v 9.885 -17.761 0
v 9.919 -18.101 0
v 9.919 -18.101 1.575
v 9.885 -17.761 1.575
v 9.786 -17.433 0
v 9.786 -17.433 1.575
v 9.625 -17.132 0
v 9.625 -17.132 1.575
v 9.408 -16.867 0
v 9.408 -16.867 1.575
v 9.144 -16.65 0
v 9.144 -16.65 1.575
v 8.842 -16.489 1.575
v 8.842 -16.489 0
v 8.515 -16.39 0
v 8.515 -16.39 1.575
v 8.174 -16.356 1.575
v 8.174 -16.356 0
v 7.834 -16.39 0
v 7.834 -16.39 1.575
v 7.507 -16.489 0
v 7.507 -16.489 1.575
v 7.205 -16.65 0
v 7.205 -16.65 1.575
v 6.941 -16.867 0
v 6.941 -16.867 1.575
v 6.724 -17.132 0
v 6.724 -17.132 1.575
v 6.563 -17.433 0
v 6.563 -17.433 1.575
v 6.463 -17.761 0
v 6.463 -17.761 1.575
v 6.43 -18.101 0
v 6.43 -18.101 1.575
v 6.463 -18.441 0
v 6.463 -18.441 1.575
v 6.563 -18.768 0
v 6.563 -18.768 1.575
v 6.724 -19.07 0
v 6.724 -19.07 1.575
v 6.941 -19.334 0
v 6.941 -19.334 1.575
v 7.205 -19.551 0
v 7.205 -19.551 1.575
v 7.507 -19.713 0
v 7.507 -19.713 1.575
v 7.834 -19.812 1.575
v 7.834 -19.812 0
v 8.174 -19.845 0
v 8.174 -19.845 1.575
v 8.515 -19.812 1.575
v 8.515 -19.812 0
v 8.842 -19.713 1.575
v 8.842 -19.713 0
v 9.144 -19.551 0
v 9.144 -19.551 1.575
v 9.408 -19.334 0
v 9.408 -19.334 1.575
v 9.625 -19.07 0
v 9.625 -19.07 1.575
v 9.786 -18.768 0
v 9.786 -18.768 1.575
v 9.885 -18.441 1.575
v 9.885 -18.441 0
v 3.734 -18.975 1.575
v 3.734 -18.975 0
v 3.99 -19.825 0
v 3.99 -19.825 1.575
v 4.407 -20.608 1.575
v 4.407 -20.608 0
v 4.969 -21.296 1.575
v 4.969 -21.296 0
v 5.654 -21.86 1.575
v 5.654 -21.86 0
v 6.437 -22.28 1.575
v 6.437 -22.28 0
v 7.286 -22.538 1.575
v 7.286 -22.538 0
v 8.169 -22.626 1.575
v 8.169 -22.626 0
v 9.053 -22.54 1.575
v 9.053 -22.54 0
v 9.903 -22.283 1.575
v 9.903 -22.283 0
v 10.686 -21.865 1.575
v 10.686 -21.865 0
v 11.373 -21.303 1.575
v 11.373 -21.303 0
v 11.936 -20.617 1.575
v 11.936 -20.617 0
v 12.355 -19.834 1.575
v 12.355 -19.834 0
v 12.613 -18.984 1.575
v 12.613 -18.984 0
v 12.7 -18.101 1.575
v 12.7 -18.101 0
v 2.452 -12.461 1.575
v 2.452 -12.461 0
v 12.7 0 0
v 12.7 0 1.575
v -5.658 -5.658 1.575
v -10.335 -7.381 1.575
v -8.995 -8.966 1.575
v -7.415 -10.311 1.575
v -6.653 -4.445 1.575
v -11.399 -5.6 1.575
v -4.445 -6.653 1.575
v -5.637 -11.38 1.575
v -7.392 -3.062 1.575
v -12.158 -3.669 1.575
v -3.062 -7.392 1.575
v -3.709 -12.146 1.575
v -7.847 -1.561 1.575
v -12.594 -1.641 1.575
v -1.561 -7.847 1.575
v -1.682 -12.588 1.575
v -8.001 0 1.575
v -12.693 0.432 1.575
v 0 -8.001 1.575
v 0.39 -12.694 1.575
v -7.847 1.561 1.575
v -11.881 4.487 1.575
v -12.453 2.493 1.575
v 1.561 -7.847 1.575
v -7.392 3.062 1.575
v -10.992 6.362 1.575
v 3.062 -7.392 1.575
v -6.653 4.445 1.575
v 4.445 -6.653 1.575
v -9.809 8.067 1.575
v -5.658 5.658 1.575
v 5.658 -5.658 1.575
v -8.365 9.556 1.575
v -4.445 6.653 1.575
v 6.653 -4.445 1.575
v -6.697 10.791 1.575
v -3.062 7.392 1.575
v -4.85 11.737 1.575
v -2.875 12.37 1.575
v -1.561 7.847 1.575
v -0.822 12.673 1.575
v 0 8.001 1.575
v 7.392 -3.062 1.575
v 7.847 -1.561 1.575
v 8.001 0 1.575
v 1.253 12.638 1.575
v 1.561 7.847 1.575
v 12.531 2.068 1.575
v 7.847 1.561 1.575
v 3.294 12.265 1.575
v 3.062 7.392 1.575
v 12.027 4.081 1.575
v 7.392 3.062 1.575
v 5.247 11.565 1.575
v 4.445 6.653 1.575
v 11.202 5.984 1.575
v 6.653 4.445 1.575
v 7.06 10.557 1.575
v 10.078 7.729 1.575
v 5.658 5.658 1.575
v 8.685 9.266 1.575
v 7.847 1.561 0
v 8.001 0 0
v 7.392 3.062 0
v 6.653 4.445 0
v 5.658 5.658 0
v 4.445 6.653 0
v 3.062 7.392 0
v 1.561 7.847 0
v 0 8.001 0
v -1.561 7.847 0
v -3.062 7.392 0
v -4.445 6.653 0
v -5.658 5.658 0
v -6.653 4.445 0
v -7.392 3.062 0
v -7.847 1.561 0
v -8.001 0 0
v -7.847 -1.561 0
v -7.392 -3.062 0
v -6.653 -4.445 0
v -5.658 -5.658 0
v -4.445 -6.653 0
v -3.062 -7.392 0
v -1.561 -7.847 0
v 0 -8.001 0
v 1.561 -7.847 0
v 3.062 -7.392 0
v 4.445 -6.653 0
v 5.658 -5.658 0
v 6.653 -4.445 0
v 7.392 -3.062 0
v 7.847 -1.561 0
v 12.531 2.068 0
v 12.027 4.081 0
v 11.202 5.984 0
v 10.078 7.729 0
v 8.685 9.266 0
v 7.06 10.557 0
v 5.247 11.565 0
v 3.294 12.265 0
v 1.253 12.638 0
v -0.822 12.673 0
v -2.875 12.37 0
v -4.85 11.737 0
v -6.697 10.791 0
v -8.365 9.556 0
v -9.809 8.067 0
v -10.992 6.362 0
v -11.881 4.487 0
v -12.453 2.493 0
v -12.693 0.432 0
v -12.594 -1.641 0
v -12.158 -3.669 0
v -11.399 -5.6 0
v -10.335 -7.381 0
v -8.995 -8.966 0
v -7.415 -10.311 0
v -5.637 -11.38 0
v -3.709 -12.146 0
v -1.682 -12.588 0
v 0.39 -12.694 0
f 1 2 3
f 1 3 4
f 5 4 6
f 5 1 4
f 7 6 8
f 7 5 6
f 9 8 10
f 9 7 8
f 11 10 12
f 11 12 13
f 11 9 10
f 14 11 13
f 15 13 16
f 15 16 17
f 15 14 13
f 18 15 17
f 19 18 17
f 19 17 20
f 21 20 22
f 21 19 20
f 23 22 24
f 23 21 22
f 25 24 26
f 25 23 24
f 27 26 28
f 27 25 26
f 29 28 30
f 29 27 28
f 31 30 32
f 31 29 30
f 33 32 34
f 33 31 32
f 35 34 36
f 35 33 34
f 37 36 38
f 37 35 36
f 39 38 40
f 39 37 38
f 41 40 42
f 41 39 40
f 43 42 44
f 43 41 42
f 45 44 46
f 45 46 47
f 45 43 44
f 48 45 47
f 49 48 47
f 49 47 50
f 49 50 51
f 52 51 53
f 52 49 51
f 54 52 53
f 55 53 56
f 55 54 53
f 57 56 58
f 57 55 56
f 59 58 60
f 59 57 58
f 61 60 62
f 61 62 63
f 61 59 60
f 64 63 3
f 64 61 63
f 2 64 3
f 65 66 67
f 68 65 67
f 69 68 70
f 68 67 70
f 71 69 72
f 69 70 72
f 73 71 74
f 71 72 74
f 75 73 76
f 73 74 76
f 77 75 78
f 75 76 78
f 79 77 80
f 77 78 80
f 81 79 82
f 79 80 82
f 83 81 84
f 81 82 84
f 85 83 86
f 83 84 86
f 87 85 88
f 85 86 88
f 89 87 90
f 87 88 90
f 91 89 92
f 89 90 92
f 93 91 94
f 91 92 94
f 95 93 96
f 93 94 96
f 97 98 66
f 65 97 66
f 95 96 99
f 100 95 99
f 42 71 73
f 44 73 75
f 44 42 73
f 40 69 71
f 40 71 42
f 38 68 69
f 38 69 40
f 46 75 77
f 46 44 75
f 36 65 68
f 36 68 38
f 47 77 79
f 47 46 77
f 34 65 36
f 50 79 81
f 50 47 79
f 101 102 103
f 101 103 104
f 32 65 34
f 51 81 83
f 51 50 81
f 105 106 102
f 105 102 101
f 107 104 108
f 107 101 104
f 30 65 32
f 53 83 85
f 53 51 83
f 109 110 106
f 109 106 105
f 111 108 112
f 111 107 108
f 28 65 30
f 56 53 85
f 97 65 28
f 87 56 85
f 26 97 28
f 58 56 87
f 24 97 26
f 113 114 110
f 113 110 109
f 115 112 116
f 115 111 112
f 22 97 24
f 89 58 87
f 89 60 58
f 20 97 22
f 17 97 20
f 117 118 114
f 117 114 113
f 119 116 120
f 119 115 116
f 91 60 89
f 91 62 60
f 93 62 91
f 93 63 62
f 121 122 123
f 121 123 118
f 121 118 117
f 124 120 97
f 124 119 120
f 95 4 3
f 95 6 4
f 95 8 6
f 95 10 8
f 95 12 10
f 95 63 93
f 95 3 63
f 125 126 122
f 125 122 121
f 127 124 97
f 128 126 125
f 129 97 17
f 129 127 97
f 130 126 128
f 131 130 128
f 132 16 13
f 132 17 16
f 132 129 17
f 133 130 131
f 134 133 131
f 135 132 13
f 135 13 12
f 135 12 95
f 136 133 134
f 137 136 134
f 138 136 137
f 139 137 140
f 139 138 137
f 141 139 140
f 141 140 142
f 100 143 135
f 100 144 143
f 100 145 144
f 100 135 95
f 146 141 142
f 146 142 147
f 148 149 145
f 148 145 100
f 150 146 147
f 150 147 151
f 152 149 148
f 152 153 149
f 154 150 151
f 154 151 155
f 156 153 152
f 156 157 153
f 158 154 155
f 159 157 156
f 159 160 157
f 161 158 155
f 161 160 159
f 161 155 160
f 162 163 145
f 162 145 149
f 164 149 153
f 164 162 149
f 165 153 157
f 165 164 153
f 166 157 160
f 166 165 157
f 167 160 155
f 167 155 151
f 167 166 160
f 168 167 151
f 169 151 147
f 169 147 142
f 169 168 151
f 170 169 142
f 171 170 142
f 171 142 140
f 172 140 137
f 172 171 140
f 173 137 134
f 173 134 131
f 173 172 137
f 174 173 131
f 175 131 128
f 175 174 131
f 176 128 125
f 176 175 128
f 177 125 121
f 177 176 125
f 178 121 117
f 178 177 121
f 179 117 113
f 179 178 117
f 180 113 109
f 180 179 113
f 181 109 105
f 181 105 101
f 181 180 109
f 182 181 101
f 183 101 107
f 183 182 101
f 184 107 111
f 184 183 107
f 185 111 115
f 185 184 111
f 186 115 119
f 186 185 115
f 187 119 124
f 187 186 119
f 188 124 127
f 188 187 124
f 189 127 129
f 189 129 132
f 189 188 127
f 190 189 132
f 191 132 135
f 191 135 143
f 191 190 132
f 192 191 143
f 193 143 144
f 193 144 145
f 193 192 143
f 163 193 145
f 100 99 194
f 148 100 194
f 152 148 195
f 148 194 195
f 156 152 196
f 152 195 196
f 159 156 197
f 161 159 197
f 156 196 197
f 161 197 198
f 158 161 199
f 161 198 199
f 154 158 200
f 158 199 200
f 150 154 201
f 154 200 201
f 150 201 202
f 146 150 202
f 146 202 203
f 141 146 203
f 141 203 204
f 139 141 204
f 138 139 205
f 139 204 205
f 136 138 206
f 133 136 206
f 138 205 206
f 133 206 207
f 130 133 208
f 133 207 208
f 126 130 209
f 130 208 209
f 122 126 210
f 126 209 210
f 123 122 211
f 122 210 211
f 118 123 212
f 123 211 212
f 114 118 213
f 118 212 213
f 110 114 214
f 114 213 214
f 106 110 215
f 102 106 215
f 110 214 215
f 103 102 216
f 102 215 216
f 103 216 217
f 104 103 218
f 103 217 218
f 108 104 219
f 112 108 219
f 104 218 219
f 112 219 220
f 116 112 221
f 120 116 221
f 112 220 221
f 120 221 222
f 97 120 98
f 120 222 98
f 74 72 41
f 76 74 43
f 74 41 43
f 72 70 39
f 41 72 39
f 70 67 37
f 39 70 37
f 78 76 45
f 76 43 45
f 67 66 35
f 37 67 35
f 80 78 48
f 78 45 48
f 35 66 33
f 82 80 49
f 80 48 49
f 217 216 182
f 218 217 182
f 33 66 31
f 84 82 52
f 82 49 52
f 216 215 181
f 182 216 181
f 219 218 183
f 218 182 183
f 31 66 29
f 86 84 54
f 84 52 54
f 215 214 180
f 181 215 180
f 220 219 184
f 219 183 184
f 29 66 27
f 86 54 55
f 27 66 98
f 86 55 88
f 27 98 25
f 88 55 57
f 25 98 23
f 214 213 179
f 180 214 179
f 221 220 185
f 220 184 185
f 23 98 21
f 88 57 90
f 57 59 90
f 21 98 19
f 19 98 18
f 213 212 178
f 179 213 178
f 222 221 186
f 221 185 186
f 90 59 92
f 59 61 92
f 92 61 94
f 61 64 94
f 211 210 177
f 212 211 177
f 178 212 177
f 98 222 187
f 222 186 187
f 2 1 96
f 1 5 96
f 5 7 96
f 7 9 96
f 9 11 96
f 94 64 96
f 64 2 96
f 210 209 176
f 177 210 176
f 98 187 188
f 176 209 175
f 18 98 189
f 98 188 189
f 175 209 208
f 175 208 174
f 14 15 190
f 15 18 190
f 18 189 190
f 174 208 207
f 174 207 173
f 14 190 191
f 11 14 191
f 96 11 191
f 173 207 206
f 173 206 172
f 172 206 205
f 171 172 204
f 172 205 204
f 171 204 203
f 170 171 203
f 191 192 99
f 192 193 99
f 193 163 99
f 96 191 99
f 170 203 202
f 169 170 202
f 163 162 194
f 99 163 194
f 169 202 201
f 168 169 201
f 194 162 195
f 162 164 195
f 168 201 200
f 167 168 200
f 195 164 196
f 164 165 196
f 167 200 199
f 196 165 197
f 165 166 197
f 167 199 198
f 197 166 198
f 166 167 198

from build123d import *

# Parameters (mm, degrees)
F0_R     = 8.001
F0_R_2   = 1.744437
F1_DEPTH = 1.5748


with BuildPart() as f1:
    # F0 (on Top) → F1 (new body)
    with BuildSketch(Plane.XY):
        with BuildLine():
            ThreePointArc((2.452167, -12.461014), (9.808989, -8.06683), (12.7, 0))
            ThreePointArc((12.7, 0), (-9.808989, 8.06683), (2.452167, -12.461014))
        make_face()
        Circle(F0_R, mode=Mode.SUBTRACT)
        with BuildLine():
            Line((12.7, -18.100876), (12.7, 0))
            ThreePointArc((12.7, 0), (9.808989, -8.06683), (2.452167, -12.461014))
            Line((2.452167, -12.461014), (3.733975, -18.974695))
            ThreePointArc((3.733975, -18.974695), (8.613387, -22.605128), (12.7, -18.100876))
        make_face()
        with Locations((8.174407, -18.100876)):
            Circle(F0_R_2, mode=Mode.SUBTRACT)
    extrude(amount=F1_DEPTH)


solid = f1.part
